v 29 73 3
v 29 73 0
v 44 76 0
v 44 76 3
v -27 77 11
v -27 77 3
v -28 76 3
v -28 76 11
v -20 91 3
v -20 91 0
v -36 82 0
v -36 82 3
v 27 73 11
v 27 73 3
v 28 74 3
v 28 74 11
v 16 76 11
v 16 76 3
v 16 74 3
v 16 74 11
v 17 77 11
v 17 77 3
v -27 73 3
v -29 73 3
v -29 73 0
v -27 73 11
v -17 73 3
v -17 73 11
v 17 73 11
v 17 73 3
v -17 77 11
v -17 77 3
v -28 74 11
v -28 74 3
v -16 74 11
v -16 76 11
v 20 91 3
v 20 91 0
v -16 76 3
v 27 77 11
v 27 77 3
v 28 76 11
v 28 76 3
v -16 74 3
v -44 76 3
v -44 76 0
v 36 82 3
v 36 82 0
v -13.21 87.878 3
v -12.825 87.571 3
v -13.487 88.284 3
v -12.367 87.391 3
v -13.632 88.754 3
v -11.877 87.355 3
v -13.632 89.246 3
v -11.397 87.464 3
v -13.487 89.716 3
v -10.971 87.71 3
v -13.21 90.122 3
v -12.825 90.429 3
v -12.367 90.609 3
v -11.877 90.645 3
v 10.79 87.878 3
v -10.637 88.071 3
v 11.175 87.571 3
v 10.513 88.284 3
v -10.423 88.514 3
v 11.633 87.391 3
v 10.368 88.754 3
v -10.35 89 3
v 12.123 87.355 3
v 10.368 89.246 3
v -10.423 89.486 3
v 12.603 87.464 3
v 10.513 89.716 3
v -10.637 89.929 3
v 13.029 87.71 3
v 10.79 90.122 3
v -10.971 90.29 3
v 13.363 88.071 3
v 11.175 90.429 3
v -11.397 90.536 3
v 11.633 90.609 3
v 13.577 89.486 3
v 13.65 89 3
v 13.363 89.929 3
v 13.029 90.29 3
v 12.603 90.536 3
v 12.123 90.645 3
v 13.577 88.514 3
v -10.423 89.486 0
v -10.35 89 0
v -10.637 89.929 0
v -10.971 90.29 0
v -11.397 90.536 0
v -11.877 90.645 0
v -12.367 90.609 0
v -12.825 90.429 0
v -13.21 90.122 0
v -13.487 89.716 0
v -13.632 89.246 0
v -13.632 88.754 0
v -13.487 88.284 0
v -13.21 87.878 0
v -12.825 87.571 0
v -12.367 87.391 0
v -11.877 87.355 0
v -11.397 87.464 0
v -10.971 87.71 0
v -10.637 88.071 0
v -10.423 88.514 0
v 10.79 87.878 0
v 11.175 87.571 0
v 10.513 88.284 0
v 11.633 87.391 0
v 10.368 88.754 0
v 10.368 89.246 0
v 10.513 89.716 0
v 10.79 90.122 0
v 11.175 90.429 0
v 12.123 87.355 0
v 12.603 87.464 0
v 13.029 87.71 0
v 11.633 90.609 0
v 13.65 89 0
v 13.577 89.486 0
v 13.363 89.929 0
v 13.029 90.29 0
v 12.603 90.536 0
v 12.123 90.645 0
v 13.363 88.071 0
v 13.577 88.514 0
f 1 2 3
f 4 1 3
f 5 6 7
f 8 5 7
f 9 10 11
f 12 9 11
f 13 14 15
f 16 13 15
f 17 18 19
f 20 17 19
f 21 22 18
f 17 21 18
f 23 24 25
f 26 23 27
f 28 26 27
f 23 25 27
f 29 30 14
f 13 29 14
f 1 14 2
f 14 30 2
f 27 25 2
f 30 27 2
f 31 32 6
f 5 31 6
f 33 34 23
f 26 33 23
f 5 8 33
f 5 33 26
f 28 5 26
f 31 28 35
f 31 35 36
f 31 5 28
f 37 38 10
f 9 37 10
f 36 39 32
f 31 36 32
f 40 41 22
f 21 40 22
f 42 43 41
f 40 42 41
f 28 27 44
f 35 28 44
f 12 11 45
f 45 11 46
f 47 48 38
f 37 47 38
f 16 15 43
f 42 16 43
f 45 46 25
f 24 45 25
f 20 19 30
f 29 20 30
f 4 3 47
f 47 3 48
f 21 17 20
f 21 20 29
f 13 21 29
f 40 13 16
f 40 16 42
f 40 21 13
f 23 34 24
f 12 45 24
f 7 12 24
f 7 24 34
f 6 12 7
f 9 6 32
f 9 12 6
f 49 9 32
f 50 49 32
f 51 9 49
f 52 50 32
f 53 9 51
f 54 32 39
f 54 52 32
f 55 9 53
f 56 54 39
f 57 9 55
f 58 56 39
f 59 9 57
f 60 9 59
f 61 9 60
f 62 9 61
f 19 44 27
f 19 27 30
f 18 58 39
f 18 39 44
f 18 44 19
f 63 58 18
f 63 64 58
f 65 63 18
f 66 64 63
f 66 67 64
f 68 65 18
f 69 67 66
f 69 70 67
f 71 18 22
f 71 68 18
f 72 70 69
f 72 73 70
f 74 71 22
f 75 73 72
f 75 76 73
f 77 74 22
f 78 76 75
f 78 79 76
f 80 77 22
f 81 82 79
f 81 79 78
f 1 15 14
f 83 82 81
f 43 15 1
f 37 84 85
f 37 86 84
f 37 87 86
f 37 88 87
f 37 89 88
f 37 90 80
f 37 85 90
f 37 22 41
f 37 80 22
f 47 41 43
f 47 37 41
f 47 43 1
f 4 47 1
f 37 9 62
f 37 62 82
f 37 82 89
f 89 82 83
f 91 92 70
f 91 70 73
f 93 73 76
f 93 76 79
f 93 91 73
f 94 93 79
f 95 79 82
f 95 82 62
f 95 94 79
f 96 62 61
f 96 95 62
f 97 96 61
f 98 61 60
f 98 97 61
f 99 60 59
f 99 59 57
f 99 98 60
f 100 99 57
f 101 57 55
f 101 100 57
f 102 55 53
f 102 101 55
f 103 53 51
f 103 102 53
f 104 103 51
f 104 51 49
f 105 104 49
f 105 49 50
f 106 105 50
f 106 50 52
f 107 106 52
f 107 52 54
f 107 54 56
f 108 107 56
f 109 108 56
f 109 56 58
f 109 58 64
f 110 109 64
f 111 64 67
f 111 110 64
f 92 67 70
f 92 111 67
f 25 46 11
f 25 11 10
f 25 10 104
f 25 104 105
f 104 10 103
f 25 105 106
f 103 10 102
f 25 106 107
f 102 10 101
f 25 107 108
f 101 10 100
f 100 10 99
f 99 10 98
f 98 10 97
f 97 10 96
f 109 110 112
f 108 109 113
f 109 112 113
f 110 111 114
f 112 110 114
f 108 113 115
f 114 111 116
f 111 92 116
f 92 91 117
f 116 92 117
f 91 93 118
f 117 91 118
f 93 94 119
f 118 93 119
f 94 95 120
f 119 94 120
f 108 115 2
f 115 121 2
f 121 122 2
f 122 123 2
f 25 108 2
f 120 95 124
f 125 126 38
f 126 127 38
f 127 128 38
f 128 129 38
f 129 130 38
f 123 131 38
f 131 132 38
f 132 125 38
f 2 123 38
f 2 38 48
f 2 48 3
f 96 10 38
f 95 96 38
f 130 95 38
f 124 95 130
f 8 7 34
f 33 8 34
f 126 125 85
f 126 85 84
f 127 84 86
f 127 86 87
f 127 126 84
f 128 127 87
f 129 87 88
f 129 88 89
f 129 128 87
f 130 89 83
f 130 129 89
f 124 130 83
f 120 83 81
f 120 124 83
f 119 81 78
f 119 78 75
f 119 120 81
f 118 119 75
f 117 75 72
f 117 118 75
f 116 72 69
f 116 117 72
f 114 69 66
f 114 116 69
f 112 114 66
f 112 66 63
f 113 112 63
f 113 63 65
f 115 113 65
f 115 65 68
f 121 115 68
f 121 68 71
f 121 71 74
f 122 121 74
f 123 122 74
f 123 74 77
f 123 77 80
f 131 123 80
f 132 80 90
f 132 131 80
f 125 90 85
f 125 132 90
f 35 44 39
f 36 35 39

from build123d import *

# Parameters (mm, degrees)
SKETCH_1_R       = 1.65
F_3MM_DEPTH      = 3
F_32MM_1_START   = 3
F_32MM_1_DEPTH   = 8
F_32MM_1_2_DEPTH = 8


with BuildPart() as part:
    # 草图1 → 斜切鼻件底座_3mm (new body)
    with BuildSketch(Plane.XY):
        Polygon((-29, 73), (29, 73), (44, 76), (36, 82), (20, 91), (-20, 91), (-36, 82), (-44, 76), align=None)
        with Locations((-12, 89)):
            Circle(SKETCH_1_R, mode=Mode.SUBTRACT)
        with Locations((12, 89)):
            Circle(SKETCH_1_R, mode=Mode.SUBTRACT)
    extrude(amount=F_3MM_DEPTH)

    # 草图2 → 32mm__-1 (add)
    with BuildSketch(Plane.XY.offset(F_32MM_1_START)):
        Polygon((-27, 73), (-17, 73), (-16, 74), (-16, 76), (-17, 77), (-27, 77), (-28, 76), (-28, 74), align=None)
    extrude(amount=F_32MM_1_DEPTH)

    # 草图3 → 32mm__1 2 (add)
    with BuildSketch(Plane.XY.offset(F_32MM_1_START)):
        Polygon((17, 73), (27, 73), (28, 74), (28, 76), (27, 77), (17, 77), (16, 76), (16, 74), align=None)
    extrude(amount=F_32MM_1_2_DEPTH)


solid = part.part
